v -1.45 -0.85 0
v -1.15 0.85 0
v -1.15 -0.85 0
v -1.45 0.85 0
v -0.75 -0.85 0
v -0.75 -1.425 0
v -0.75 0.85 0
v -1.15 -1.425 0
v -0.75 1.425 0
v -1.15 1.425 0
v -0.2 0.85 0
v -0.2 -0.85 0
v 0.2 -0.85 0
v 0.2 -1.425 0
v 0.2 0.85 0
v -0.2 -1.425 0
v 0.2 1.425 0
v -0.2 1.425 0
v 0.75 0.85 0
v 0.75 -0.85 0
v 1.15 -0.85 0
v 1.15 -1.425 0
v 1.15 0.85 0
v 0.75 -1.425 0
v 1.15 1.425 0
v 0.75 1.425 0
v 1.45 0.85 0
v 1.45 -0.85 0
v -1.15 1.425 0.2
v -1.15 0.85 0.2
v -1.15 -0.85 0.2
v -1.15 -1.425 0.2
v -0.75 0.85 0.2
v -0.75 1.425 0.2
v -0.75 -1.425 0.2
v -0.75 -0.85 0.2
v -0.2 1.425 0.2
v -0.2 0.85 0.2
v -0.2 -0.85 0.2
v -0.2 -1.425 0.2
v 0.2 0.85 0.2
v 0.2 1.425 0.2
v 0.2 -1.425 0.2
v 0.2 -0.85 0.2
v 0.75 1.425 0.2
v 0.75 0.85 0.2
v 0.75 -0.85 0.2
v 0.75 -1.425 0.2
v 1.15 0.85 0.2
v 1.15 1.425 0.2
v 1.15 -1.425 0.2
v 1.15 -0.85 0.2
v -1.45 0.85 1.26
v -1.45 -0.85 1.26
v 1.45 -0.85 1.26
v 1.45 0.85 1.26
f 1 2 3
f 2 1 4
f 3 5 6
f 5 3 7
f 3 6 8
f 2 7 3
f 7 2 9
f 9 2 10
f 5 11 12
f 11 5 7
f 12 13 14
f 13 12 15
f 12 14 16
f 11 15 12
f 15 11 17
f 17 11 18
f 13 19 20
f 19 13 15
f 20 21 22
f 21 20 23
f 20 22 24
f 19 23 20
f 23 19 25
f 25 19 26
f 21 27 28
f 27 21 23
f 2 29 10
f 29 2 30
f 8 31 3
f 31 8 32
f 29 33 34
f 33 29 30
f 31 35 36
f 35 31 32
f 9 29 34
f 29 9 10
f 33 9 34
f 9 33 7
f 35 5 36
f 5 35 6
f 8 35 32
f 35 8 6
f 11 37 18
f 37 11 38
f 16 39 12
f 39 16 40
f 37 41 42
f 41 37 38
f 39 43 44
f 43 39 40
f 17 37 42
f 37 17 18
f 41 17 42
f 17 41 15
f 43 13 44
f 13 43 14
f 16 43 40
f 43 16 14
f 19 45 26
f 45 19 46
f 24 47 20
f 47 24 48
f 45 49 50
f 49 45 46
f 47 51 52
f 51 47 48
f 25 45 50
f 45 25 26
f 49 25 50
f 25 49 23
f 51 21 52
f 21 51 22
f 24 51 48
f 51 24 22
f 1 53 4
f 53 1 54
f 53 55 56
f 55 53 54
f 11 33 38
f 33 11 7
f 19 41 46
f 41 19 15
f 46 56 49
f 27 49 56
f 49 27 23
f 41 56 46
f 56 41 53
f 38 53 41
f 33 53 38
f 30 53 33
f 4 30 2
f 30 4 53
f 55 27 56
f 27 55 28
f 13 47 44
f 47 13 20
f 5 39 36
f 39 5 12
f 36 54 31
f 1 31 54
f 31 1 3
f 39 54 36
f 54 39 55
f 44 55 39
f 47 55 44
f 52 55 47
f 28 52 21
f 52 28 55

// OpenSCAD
$fa = 2; $fs = 0.2;

module sot23() {
    color("black")
        linear_extrude(1.26)
            square([2.9, 1.7], center = true);
    color("silver")
        for (a = [-1:1])
            translate([a * 0.95, 0, 0])
                linear_extrude(0.2)
                    square([0.4, 2.85], center = true);
}

sot23();
